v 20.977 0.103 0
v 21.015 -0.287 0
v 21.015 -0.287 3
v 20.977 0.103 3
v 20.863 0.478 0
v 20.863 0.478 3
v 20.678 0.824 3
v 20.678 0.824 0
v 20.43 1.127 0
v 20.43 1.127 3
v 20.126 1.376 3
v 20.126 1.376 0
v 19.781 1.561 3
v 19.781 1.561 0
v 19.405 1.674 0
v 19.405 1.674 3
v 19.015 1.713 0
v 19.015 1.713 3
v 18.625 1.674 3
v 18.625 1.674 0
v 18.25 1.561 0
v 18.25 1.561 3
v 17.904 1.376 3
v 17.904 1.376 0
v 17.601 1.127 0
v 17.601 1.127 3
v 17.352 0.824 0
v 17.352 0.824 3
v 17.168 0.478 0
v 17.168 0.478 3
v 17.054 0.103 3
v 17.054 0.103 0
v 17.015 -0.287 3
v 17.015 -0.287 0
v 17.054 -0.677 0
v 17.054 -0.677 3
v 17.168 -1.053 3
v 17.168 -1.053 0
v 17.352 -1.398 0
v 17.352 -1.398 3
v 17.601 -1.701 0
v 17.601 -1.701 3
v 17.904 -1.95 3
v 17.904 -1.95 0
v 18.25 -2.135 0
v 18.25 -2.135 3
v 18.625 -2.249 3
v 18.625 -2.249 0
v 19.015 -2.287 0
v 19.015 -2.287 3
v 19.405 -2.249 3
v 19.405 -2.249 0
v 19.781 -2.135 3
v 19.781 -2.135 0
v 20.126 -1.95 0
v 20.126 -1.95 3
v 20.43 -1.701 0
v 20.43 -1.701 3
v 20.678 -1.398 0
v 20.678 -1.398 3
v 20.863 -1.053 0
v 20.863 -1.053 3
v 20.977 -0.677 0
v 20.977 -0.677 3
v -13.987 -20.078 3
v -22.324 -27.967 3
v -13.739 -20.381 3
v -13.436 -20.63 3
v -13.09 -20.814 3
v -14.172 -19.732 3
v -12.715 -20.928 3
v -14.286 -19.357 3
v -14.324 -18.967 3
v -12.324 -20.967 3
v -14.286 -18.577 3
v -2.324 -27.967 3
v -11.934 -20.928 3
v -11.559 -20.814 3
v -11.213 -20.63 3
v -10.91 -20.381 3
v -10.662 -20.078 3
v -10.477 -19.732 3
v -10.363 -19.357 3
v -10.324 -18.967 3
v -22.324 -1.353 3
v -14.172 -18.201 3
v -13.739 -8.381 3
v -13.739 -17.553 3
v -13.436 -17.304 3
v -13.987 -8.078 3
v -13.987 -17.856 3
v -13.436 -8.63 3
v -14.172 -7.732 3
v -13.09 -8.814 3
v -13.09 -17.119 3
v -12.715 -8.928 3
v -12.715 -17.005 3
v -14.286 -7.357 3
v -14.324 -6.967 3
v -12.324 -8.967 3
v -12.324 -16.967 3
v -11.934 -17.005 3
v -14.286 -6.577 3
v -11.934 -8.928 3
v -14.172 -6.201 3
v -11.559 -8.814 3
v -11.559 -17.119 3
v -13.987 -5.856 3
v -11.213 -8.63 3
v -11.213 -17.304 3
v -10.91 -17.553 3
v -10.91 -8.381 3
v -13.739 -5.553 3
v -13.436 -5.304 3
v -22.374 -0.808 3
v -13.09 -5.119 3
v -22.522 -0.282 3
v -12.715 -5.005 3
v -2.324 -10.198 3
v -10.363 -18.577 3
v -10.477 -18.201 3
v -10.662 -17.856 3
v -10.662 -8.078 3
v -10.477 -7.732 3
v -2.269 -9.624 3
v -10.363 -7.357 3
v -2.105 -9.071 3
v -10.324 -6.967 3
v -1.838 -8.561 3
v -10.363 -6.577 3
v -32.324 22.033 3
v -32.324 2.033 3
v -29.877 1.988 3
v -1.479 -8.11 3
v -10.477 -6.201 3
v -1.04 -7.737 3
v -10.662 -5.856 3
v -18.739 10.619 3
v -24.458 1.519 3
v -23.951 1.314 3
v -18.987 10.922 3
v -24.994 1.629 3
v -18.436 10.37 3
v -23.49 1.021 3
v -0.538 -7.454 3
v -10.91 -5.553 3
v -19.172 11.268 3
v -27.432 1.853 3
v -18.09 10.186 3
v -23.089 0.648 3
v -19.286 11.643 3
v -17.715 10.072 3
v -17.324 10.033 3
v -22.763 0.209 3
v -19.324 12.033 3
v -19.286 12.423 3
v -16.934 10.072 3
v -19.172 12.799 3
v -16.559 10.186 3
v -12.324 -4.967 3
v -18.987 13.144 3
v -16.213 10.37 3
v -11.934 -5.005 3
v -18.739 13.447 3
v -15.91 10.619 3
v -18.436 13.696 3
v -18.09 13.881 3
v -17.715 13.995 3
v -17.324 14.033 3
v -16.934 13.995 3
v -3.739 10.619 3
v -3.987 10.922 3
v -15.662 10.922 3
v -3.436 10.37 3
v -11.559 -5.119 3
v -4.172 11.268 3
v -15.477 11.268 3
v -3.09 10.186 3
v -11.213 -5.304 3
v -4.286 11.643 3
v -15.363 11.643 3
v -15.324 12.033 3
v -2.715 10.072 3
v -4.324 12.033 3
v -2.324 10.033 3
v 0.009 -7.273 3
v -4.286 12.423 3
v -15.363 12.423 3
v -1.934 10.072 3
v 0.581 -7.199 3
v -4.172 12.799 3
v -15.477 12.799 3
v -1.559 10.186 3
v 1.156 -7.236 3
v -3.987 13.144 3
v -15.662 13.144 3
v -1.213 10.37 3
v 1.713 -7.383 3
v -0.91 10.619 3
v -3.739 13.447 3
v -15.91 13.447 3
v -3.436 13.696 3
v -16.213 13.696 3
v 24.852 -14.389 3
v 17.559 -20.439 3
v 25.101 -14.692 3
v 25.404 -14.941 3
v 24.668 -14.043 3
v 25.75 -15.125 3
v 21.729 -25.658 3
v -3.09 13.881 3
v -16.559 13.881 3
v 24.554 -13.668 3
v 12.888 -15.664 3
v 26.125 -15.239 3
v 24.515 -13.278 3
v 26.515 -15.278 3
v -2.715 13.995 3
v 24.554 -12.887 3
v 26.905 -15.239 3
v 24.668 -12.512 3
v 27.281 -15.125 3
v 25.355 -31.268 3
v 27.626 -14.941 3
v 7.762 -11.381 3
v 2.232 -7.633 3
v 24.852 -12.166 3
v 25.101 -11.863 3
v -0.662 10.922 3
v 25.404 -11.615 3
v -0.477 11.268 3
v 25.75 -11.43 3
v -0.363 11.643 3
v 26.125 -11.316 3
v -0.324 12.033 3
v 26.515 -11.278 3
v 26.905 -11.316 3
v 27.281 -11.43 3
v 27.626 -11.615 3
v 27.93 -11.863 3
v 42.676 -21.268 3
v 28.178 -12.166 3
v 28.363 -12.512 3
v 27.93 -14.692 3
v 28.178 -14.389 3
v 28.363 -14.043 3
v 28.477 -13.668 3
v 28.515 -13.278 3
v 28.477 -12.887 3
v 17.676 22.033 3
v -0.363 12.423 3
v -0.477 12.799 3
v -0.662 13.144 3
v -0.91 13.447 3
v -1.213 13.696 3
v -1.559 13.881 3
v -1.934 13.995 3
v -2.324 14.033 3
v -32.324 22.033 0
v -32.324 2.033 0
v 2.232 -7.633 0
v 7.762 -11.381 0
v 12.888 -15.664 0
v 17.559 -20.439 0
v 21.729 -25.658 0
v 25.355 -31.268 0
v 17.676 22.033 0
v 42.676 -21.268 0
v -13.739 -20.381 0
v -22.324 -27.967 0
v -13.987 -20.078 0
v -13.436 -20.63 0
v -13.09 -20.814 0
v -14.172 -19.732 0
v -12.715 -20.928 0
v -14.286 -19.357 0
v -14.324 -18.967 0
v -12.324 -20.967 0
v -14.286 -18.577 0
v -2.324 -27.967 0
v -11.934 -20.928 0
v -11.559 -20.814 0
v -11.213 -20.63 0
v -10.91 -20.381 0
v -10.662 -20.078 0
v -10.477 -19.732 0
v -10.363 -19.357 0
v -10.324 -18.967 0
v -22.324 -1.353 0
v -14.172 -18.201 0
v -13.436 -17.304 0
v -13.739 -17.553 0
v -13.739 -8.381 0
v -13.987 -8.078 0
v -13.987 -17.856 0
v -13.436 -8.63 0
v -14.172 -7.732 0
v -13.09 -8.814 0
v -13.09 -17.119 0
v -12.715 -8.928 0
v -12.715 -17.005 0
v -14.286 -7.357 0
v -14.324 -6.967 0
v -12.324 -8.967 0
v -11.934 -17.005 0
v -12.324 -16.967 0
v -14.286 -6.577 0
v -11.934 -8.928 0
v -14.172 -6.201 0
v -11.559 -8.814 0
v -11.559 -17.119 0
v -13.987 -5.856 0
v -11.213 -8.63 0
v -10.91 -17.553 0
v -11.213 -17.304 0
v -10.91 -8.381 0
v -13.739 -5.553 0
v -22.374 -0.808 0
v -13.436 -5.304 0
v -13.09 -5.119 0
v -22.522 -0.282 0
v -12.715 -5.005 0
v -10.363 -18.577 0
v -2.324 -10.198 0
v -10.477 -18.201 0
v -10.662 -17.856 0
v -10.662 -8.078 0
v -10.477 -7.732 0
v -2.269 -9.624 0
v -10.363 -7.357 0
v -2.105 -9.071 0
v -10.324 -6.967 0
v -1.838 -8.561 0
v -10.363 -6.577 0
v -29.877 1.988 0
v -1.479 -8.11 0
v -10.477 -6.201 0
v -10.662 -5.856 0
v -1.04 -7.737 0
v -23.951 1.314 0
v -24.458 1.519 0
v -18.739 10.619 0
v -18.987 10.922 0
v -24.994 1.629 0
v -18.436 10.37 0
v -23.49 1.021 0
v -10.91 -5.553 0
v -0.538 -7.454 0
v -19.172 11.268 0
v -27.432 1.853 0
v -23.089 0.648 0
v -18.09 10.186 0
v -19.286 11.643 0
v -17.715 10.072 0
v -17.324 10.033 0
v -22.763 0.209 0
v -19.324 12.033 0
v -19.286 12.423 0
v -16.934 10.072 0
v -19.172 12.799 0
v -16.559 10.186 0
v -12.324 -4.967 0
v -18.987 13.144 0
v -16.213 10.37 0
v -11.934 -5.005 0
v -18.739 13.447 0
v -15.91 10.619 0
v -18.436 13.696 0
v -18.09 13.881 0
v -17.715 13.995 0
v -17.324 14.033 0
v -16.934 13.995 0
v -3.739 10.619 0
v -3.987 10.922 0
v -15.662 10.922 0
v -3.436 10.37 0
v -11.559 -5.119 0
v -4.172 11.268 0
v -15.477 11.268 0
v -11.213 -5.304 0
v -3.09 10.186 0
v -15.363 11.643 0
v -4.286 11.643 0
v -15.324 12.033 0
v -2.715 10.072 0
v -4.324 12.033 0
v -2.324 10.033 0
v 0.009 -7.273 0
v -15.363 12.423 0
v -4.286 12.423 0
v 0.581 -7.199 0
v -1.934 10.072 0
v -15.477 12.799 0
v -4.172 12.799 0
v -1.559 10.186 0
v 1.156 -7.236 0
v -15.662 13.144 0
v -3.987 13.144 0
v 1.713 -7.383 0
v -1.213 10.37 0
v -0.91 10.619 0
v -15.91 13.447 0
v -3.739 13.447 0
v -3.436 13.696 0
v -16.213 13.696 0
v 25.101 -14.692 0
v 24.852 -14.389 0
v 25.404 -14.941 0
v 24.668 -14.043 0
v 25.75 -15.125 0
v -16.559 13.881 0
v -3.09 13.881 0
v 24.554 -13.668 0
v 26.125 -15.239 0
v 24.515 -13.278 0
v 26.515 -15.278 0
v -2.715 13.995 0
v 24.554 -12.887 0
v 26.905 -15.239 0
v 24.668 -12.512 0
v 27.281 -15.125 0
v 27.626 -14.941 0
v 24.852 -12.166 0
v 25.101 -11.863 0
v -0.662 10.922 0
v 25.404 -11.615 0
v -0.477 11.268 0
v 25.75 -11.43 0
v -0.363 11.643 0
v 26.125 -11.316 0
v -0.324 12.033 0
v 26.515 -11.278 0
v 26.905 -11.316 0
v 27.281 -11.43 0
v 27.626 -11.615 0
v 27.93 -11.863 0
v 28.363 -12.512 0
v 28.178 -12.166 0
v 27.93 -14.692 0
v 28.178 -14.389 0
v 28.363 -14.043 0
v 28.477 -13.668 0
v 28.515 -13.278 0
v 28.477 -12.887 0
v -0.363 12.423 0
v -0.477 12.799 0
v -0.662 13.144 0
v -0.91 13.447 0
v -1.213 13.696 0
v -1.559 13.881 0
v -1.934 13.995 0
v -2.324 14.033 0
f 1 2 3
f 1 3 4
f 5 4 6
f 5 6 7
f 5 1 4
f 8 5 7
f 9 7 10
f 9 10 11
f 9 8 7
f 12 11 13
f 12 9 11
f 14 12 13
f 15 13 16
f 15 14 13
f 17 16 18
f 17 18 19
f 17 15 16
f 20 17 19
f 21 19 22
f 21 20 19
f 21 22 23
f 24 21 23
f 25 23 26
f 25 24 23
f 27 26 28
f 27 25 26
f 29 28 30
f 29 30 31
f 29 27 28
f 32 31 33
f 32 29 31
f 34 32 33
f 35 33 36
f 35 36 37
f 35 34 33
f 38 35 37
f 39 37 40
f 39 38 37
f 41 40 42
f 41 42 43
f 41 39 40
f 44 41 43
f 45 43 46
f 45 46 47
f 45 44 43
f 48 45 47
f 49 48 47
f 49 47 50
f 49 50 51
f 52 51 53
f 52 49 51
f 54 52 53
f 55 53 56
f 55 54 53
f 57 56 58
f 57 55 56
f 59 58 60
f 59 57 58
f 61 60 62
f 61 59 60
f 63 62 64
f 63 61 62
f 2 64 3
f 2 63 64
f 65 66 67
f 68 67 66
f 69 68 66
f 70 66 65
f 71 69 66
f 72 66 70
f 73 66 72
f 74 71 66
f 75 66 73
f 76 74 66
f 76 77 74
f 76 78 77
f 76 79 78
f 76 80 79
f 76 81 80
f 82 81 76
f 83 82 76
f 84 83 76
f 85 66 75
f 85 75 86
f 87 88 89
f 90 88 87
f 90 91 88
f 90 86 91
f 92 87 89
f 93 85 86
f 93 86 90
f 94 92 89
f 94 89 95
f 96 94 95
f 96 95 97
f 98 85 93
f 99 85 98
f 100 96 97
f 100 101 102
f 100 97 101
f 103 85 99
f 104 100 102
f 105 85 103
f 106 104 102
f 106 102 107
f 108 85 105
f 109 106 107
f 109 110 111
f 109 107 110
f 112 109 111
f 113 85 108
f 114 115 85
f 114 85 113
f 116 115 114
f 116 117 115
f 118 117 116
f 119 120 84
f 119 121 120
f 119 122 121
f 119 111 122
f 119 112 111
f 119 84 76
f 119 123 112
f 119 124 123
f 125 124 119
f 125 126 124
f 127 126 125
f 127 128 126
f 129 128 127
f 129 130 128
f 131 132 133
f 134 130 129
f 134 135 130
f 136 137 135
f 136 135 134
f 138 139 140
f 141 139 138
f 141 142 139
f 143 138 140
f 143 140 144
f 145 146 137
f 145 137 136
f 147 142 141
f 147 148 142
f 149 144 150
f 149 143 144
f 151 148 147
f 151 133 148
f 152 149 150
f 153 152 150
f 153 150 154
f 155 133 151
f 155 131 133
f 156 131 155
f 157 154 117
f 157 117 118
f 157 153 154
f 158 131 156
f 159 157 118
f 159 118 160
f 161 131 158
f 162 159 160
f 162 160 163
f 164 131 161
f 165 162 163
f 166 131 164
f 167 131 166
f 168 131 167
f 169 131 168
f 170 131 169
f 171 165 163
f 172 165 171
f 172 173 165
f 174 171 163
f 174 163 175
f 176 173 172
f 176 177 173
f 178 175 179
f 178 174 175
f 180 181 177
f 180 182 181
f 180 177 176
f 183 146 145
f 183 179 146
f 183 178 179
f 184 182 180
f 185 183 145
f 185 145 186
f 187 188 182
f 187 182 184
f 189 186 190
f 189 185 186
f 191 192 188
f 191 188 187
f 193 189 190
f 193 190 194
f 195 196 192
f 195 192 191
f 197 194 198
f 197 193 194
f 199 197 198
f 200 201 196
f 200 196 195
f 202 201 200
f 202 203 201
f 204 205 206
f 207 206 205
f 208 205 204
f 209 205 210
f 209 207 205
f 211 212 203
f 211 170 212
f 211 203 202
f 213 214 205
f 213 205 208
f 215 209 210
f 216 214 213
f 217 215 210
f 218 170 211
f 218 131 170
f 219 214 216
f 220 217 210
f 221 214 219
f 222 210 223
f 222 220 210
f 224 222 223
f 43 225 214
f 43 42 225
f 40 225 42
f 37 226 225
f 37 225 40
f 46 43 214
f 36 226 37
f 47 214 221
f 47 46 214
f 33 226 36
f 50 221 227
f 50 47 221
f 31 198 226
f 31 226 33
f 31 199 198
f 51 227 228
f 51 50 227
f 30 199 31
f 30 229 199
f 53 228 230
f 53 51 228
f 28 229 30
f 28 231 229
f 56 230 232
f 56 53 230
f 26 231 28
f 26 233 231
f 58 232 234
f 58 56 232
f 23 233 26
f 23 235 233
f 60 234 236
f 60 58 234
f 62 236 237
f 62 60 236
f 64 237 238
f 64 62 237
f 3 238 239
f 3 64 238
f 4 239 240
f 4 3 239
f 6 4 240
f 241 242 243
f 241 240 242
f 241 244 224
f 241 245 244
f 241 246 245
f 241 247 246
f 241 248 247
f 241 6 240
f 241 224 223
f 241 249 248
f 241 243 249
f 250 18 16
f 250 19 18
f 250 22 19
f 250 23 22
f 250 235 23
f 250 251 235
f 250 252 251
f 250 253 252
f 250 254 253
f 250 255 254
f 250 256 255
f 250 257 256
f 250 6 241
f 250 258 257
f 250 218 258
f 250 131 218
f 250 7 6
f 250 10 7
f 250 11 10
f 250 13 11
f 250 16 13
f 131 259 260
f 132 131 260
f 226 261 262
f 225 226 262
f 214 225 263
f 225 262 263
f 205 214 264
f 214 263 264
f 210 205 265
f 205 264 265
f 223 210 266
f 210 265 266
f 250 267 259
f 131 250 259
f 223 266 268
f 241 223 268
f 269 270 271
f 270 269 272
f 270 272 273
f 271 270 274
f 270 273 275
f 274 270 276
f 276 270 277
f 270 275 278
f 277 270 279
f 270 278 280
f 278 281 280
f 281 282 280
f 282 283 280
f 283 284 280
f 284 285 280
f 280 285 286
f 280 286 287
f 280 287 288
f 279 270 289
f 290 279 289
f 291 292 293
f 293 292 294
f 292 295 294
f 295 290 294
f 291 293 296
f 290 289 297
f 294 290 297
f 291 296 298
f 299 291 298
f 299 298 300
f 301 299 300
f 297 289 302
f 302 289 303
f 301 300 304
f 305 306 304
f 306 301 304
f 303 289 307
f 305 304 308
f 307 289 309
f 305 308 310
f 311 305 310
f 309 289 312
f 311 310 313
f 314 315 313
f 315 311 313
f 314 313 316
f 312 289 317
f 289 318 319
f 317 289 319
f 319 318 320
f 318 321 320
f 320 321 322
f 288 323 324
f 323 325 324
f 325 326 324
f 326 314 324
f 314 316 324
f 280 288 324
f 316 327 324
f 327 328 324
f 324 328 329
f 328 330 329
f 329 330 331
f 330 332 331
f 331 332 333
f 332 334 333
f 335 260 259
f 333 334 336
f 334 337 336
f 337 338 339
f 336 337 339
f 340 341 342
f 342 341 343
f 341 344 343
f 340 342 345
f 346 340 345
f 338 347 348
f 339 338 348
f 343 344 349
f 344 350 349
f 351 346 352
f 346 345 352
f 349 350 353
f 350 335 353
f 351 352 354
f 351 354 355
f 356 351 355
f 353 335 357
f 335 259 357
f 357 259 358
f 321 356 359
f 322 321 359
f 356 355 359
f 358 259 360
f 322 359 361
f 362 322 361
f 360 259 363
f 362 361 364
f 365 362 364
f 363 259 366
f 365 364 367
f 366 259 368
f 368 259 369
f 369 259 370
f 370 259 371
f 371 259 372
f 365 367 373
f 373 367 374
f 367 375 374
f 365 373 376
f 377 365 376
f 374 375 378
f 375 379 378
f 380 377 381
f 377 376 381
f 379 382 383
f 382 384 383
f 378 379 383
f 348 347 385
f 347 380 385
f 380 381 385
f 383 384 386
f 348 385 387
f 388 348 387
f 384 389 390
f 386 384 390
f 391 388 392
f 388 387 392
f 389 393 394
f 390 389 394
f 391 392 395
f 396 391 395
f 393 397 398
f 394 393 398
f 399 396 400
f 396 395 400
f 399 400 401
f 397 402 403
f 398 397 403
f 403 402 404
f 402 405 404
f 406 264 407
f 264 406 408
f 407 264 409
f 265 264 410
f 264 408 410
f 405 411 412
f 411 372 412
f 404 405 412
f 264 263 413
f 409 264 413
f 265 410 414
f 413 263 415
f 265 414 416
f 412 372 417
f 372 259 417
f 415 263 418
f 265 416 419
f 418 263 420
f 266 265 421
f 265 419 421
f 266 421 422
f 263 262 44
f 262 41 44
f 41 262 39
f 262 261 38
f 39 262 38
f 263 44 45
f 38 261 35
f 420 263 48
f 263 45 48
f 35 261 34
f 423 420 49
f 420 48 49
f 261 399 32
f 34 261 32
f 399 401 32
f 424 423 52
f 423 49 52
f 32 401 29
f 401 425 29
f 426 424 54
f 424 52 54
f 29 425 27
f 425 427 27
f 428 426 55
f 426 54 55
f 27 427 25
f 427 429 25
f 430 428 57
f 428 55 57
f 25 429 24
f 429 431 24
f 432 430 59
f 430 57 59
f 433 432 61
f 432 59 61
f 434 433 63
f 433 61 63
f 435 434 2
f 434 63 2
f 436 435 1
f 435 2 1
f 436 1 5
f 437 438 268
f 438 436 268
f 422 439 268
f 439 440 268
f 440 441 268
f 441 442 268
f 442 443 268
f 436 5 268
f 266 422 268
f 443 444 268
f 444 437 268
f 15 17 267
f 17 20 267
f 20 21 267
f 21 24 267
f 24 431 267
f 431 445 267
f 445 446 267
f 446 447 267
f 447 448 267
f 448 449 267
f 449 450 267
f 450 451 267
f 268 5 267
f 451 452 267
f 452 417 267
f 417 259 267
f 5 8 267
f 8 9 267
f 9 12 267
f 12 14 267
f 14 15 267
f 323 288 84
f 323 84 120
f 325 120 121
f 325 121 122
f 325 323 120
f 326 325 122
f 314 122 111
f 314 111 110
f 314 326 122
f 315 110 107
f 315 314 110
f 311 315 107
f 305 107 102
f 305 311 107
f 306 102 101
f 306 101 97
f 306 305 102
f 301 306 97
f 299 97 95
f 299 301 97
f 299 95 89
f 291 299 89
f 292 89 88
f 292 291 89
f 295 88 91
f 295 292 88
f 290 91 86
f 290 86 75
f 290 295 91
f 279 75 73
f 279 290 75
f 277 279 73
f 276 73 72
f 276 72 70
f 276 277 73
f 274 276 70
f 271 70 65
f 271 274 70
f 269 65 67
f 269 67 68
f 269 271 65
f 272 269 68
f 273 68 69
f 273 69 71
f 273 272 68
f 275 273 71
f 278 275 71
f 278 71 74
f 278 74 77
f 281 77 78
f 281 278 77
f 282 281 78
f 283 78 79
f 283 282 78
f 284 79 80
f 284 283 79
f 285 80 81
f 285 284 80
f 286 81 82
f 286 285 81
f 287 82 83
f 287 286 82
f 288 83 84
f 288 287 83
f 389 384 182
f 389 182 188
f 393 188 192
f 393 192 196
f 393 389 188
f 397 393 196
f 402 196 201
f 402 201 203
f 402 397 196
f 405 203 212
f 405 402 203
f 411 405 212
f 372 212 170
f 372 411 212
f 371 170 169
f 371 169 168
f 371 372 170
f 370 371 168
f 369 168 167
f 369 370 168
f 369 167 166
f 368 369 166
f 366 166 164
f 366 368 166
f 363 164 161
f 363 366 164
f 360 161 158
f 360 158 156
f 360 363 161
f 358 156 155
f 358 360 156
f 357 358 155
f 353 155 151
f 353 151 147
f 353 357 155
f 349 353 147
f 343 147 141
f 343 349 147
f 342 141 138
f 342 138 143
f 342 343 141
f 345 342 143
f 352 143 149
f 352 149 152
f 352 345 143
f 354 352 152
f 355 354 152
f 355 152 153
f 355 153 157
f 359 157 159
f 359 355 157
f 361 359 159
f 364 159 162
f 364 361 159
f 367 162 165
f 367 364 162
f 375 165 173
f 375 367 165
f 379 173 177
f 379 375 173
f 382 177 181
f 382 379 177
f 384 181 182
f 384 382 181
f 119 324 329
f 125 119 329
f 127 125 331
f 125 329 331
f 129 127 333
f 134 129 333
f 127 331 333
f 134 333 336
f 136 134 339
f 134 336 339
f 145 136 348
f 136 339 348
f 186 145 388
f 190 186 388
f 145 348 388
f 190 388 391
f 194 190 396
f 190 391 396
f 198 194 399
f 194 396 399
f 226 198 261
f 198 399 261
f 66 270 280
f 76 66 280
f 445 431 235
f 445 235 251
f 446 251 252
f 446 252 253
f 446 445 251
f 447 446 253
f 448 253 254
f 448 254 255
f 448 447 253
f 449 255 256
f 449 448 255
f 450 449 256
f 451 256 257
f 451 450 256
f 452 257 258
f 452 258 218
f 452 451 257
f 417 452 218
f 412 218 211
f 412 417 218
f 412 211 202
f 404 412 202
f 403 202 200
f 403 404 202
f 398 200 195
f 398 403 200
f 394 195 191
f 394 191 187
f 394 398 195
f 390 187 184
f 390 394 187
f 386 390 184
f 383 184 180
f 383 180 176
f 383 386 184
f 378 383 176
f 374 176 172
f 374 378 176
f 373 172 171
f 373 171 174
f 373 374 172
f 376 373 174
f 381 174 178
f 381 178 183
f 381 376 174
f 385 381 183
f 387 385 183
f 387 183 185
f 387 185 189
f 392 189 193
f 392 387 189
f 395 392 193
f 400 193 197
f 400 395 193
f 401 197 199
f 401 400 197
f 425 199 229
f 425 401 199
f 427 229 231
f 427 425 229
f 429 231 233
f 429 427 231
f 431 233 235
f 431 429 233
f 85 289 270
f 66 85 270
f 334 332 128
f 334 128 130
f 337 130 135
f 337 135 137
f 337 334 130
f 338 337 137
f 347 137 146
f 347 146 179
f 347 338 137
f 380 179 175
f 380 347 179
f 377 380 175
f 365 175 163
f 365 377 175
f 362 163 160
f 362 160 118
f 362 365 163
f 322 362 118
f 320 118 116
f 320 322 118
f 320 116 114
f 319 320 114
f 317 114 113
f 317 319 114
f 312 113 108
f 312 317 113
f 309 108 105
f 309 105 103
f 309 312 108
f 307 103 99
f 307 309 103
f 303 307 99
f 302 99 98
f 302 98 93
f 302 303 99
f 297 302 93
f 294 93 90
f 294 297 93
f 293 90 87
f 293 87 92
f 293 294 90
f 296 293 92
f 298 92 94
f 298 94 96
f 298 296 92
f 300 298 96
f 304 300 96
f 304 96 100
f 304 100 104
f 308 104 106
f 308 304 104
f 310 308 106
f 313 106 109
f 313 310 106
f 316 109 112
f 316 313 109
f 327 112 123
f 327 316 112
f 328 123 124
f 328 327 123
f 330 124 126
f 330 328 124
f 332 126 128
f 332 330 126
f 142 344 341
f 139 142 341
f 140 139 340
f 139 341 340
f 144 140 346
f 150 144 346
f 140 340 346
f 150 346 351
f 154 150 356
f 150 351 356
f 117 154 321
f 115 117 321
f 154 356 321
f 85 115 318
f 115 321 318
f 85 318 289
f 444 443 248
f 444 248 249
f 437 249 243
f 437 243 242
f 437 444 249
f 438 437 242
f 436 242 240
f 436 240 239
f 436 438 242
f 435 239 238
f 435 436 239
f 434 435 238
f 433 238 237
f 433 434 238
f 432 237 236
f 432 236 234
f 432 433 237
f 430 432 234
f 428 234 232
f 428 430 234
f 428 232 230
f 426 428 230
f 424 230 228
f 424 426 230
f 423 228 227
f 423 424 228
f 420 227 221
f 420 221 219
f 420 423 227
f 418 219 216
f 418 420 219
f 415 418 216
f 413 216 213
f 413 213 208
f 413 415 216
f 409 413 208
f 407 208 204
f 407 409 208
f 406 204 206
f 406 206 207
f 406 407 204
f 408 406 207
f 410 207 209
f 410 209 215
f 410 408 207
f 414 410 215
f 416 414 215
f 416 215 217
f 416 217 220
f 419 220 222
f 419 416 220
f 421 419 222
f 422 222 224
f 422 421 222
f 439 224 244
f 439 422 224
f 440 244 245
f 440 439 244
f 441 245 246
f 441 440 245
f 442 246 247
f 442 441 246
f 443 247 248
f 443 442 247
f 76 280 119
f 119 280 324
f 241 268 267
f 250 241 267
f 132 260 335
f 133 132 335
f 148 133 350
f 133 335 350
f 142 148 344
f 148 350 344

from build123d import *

# Parameters (mm, degrees)
SKETCH_1_R      = 2
EXTRUDE_1_DEPTH = 3


with BuildPart() as part:
    # 草图1 → 凸台-拉伸1 (new body)
    with BuildSketch(Plane.XY):
        with BuildLine():
            Line((-22.324440756, -1.353097581), (-22.324440756, -27.966719239))
            Line((-22.324440756, -27.966719239), (-2.324440756, -27.966719239))
            Line((-2.324440756, -27.966719239), (-2.324440756, -10.197546911))
            ThreePointArc((-2.324440756, -10.197546911), (-0.7958984, -7.583199497), (2.232100844, -7.632945919))
            ThreePointArc((2.232100844, -7.632945919), (15.283597331, -17.99273018), (25.355051168, -31.267989428))
            Line((25.355051168, -31.267989428), (42.675559244, -21.267989428))
            Line((42.675559244, -21.267989428), (17.675559244, 22.033280761))
            Line((17.675559244, 22.033280761), (-32.324440756, 22.033280761))
            Line((-32.324440756, 22.033280761), (-32.324440756, 2.033280761))
            ThreePointArc((-32.324440756, 2.033280761), (-28.653774048, 1.932053083), (-24.994265265, 1.628677754))
            ThreePointArc((-24.994265265, 1.628677754), (-23.089432202, 0.64808626), (-22.324440756, -1.353097581))
        make_face()
        with Locations((-17.324440756, 12.033280761)):
            Circle(SKETCH_1_R, mode=Mode.SUBTRACT)
        with Locations((-2.324440756, 12.033280761)):
            Circle(SKETCH_1_R, mode=Mode.SUBTRACT)
        with Locations((19.015305206, -0.287227314)):
            Circle(SKETCH_1_R, mode=Mode.SUBTRACT)
        with Locations((26.515305206, -13.277608371)):
            Circle(SKETCH_1_R, mode=Mode.SUBTRACT)
        with Locations((-12.324440756, -18.966719239)):
            Circle(SKETCH_1_R, mode=Mode.SUBTRACT)
        with Locations((-12.324440756, -6.966719239)):
            Circle(SKETCH_1_R, mode=Mode.SUBTRACT)
    extrude(amount=EXTRUDE_1_DEPTH)


solid = part.part
